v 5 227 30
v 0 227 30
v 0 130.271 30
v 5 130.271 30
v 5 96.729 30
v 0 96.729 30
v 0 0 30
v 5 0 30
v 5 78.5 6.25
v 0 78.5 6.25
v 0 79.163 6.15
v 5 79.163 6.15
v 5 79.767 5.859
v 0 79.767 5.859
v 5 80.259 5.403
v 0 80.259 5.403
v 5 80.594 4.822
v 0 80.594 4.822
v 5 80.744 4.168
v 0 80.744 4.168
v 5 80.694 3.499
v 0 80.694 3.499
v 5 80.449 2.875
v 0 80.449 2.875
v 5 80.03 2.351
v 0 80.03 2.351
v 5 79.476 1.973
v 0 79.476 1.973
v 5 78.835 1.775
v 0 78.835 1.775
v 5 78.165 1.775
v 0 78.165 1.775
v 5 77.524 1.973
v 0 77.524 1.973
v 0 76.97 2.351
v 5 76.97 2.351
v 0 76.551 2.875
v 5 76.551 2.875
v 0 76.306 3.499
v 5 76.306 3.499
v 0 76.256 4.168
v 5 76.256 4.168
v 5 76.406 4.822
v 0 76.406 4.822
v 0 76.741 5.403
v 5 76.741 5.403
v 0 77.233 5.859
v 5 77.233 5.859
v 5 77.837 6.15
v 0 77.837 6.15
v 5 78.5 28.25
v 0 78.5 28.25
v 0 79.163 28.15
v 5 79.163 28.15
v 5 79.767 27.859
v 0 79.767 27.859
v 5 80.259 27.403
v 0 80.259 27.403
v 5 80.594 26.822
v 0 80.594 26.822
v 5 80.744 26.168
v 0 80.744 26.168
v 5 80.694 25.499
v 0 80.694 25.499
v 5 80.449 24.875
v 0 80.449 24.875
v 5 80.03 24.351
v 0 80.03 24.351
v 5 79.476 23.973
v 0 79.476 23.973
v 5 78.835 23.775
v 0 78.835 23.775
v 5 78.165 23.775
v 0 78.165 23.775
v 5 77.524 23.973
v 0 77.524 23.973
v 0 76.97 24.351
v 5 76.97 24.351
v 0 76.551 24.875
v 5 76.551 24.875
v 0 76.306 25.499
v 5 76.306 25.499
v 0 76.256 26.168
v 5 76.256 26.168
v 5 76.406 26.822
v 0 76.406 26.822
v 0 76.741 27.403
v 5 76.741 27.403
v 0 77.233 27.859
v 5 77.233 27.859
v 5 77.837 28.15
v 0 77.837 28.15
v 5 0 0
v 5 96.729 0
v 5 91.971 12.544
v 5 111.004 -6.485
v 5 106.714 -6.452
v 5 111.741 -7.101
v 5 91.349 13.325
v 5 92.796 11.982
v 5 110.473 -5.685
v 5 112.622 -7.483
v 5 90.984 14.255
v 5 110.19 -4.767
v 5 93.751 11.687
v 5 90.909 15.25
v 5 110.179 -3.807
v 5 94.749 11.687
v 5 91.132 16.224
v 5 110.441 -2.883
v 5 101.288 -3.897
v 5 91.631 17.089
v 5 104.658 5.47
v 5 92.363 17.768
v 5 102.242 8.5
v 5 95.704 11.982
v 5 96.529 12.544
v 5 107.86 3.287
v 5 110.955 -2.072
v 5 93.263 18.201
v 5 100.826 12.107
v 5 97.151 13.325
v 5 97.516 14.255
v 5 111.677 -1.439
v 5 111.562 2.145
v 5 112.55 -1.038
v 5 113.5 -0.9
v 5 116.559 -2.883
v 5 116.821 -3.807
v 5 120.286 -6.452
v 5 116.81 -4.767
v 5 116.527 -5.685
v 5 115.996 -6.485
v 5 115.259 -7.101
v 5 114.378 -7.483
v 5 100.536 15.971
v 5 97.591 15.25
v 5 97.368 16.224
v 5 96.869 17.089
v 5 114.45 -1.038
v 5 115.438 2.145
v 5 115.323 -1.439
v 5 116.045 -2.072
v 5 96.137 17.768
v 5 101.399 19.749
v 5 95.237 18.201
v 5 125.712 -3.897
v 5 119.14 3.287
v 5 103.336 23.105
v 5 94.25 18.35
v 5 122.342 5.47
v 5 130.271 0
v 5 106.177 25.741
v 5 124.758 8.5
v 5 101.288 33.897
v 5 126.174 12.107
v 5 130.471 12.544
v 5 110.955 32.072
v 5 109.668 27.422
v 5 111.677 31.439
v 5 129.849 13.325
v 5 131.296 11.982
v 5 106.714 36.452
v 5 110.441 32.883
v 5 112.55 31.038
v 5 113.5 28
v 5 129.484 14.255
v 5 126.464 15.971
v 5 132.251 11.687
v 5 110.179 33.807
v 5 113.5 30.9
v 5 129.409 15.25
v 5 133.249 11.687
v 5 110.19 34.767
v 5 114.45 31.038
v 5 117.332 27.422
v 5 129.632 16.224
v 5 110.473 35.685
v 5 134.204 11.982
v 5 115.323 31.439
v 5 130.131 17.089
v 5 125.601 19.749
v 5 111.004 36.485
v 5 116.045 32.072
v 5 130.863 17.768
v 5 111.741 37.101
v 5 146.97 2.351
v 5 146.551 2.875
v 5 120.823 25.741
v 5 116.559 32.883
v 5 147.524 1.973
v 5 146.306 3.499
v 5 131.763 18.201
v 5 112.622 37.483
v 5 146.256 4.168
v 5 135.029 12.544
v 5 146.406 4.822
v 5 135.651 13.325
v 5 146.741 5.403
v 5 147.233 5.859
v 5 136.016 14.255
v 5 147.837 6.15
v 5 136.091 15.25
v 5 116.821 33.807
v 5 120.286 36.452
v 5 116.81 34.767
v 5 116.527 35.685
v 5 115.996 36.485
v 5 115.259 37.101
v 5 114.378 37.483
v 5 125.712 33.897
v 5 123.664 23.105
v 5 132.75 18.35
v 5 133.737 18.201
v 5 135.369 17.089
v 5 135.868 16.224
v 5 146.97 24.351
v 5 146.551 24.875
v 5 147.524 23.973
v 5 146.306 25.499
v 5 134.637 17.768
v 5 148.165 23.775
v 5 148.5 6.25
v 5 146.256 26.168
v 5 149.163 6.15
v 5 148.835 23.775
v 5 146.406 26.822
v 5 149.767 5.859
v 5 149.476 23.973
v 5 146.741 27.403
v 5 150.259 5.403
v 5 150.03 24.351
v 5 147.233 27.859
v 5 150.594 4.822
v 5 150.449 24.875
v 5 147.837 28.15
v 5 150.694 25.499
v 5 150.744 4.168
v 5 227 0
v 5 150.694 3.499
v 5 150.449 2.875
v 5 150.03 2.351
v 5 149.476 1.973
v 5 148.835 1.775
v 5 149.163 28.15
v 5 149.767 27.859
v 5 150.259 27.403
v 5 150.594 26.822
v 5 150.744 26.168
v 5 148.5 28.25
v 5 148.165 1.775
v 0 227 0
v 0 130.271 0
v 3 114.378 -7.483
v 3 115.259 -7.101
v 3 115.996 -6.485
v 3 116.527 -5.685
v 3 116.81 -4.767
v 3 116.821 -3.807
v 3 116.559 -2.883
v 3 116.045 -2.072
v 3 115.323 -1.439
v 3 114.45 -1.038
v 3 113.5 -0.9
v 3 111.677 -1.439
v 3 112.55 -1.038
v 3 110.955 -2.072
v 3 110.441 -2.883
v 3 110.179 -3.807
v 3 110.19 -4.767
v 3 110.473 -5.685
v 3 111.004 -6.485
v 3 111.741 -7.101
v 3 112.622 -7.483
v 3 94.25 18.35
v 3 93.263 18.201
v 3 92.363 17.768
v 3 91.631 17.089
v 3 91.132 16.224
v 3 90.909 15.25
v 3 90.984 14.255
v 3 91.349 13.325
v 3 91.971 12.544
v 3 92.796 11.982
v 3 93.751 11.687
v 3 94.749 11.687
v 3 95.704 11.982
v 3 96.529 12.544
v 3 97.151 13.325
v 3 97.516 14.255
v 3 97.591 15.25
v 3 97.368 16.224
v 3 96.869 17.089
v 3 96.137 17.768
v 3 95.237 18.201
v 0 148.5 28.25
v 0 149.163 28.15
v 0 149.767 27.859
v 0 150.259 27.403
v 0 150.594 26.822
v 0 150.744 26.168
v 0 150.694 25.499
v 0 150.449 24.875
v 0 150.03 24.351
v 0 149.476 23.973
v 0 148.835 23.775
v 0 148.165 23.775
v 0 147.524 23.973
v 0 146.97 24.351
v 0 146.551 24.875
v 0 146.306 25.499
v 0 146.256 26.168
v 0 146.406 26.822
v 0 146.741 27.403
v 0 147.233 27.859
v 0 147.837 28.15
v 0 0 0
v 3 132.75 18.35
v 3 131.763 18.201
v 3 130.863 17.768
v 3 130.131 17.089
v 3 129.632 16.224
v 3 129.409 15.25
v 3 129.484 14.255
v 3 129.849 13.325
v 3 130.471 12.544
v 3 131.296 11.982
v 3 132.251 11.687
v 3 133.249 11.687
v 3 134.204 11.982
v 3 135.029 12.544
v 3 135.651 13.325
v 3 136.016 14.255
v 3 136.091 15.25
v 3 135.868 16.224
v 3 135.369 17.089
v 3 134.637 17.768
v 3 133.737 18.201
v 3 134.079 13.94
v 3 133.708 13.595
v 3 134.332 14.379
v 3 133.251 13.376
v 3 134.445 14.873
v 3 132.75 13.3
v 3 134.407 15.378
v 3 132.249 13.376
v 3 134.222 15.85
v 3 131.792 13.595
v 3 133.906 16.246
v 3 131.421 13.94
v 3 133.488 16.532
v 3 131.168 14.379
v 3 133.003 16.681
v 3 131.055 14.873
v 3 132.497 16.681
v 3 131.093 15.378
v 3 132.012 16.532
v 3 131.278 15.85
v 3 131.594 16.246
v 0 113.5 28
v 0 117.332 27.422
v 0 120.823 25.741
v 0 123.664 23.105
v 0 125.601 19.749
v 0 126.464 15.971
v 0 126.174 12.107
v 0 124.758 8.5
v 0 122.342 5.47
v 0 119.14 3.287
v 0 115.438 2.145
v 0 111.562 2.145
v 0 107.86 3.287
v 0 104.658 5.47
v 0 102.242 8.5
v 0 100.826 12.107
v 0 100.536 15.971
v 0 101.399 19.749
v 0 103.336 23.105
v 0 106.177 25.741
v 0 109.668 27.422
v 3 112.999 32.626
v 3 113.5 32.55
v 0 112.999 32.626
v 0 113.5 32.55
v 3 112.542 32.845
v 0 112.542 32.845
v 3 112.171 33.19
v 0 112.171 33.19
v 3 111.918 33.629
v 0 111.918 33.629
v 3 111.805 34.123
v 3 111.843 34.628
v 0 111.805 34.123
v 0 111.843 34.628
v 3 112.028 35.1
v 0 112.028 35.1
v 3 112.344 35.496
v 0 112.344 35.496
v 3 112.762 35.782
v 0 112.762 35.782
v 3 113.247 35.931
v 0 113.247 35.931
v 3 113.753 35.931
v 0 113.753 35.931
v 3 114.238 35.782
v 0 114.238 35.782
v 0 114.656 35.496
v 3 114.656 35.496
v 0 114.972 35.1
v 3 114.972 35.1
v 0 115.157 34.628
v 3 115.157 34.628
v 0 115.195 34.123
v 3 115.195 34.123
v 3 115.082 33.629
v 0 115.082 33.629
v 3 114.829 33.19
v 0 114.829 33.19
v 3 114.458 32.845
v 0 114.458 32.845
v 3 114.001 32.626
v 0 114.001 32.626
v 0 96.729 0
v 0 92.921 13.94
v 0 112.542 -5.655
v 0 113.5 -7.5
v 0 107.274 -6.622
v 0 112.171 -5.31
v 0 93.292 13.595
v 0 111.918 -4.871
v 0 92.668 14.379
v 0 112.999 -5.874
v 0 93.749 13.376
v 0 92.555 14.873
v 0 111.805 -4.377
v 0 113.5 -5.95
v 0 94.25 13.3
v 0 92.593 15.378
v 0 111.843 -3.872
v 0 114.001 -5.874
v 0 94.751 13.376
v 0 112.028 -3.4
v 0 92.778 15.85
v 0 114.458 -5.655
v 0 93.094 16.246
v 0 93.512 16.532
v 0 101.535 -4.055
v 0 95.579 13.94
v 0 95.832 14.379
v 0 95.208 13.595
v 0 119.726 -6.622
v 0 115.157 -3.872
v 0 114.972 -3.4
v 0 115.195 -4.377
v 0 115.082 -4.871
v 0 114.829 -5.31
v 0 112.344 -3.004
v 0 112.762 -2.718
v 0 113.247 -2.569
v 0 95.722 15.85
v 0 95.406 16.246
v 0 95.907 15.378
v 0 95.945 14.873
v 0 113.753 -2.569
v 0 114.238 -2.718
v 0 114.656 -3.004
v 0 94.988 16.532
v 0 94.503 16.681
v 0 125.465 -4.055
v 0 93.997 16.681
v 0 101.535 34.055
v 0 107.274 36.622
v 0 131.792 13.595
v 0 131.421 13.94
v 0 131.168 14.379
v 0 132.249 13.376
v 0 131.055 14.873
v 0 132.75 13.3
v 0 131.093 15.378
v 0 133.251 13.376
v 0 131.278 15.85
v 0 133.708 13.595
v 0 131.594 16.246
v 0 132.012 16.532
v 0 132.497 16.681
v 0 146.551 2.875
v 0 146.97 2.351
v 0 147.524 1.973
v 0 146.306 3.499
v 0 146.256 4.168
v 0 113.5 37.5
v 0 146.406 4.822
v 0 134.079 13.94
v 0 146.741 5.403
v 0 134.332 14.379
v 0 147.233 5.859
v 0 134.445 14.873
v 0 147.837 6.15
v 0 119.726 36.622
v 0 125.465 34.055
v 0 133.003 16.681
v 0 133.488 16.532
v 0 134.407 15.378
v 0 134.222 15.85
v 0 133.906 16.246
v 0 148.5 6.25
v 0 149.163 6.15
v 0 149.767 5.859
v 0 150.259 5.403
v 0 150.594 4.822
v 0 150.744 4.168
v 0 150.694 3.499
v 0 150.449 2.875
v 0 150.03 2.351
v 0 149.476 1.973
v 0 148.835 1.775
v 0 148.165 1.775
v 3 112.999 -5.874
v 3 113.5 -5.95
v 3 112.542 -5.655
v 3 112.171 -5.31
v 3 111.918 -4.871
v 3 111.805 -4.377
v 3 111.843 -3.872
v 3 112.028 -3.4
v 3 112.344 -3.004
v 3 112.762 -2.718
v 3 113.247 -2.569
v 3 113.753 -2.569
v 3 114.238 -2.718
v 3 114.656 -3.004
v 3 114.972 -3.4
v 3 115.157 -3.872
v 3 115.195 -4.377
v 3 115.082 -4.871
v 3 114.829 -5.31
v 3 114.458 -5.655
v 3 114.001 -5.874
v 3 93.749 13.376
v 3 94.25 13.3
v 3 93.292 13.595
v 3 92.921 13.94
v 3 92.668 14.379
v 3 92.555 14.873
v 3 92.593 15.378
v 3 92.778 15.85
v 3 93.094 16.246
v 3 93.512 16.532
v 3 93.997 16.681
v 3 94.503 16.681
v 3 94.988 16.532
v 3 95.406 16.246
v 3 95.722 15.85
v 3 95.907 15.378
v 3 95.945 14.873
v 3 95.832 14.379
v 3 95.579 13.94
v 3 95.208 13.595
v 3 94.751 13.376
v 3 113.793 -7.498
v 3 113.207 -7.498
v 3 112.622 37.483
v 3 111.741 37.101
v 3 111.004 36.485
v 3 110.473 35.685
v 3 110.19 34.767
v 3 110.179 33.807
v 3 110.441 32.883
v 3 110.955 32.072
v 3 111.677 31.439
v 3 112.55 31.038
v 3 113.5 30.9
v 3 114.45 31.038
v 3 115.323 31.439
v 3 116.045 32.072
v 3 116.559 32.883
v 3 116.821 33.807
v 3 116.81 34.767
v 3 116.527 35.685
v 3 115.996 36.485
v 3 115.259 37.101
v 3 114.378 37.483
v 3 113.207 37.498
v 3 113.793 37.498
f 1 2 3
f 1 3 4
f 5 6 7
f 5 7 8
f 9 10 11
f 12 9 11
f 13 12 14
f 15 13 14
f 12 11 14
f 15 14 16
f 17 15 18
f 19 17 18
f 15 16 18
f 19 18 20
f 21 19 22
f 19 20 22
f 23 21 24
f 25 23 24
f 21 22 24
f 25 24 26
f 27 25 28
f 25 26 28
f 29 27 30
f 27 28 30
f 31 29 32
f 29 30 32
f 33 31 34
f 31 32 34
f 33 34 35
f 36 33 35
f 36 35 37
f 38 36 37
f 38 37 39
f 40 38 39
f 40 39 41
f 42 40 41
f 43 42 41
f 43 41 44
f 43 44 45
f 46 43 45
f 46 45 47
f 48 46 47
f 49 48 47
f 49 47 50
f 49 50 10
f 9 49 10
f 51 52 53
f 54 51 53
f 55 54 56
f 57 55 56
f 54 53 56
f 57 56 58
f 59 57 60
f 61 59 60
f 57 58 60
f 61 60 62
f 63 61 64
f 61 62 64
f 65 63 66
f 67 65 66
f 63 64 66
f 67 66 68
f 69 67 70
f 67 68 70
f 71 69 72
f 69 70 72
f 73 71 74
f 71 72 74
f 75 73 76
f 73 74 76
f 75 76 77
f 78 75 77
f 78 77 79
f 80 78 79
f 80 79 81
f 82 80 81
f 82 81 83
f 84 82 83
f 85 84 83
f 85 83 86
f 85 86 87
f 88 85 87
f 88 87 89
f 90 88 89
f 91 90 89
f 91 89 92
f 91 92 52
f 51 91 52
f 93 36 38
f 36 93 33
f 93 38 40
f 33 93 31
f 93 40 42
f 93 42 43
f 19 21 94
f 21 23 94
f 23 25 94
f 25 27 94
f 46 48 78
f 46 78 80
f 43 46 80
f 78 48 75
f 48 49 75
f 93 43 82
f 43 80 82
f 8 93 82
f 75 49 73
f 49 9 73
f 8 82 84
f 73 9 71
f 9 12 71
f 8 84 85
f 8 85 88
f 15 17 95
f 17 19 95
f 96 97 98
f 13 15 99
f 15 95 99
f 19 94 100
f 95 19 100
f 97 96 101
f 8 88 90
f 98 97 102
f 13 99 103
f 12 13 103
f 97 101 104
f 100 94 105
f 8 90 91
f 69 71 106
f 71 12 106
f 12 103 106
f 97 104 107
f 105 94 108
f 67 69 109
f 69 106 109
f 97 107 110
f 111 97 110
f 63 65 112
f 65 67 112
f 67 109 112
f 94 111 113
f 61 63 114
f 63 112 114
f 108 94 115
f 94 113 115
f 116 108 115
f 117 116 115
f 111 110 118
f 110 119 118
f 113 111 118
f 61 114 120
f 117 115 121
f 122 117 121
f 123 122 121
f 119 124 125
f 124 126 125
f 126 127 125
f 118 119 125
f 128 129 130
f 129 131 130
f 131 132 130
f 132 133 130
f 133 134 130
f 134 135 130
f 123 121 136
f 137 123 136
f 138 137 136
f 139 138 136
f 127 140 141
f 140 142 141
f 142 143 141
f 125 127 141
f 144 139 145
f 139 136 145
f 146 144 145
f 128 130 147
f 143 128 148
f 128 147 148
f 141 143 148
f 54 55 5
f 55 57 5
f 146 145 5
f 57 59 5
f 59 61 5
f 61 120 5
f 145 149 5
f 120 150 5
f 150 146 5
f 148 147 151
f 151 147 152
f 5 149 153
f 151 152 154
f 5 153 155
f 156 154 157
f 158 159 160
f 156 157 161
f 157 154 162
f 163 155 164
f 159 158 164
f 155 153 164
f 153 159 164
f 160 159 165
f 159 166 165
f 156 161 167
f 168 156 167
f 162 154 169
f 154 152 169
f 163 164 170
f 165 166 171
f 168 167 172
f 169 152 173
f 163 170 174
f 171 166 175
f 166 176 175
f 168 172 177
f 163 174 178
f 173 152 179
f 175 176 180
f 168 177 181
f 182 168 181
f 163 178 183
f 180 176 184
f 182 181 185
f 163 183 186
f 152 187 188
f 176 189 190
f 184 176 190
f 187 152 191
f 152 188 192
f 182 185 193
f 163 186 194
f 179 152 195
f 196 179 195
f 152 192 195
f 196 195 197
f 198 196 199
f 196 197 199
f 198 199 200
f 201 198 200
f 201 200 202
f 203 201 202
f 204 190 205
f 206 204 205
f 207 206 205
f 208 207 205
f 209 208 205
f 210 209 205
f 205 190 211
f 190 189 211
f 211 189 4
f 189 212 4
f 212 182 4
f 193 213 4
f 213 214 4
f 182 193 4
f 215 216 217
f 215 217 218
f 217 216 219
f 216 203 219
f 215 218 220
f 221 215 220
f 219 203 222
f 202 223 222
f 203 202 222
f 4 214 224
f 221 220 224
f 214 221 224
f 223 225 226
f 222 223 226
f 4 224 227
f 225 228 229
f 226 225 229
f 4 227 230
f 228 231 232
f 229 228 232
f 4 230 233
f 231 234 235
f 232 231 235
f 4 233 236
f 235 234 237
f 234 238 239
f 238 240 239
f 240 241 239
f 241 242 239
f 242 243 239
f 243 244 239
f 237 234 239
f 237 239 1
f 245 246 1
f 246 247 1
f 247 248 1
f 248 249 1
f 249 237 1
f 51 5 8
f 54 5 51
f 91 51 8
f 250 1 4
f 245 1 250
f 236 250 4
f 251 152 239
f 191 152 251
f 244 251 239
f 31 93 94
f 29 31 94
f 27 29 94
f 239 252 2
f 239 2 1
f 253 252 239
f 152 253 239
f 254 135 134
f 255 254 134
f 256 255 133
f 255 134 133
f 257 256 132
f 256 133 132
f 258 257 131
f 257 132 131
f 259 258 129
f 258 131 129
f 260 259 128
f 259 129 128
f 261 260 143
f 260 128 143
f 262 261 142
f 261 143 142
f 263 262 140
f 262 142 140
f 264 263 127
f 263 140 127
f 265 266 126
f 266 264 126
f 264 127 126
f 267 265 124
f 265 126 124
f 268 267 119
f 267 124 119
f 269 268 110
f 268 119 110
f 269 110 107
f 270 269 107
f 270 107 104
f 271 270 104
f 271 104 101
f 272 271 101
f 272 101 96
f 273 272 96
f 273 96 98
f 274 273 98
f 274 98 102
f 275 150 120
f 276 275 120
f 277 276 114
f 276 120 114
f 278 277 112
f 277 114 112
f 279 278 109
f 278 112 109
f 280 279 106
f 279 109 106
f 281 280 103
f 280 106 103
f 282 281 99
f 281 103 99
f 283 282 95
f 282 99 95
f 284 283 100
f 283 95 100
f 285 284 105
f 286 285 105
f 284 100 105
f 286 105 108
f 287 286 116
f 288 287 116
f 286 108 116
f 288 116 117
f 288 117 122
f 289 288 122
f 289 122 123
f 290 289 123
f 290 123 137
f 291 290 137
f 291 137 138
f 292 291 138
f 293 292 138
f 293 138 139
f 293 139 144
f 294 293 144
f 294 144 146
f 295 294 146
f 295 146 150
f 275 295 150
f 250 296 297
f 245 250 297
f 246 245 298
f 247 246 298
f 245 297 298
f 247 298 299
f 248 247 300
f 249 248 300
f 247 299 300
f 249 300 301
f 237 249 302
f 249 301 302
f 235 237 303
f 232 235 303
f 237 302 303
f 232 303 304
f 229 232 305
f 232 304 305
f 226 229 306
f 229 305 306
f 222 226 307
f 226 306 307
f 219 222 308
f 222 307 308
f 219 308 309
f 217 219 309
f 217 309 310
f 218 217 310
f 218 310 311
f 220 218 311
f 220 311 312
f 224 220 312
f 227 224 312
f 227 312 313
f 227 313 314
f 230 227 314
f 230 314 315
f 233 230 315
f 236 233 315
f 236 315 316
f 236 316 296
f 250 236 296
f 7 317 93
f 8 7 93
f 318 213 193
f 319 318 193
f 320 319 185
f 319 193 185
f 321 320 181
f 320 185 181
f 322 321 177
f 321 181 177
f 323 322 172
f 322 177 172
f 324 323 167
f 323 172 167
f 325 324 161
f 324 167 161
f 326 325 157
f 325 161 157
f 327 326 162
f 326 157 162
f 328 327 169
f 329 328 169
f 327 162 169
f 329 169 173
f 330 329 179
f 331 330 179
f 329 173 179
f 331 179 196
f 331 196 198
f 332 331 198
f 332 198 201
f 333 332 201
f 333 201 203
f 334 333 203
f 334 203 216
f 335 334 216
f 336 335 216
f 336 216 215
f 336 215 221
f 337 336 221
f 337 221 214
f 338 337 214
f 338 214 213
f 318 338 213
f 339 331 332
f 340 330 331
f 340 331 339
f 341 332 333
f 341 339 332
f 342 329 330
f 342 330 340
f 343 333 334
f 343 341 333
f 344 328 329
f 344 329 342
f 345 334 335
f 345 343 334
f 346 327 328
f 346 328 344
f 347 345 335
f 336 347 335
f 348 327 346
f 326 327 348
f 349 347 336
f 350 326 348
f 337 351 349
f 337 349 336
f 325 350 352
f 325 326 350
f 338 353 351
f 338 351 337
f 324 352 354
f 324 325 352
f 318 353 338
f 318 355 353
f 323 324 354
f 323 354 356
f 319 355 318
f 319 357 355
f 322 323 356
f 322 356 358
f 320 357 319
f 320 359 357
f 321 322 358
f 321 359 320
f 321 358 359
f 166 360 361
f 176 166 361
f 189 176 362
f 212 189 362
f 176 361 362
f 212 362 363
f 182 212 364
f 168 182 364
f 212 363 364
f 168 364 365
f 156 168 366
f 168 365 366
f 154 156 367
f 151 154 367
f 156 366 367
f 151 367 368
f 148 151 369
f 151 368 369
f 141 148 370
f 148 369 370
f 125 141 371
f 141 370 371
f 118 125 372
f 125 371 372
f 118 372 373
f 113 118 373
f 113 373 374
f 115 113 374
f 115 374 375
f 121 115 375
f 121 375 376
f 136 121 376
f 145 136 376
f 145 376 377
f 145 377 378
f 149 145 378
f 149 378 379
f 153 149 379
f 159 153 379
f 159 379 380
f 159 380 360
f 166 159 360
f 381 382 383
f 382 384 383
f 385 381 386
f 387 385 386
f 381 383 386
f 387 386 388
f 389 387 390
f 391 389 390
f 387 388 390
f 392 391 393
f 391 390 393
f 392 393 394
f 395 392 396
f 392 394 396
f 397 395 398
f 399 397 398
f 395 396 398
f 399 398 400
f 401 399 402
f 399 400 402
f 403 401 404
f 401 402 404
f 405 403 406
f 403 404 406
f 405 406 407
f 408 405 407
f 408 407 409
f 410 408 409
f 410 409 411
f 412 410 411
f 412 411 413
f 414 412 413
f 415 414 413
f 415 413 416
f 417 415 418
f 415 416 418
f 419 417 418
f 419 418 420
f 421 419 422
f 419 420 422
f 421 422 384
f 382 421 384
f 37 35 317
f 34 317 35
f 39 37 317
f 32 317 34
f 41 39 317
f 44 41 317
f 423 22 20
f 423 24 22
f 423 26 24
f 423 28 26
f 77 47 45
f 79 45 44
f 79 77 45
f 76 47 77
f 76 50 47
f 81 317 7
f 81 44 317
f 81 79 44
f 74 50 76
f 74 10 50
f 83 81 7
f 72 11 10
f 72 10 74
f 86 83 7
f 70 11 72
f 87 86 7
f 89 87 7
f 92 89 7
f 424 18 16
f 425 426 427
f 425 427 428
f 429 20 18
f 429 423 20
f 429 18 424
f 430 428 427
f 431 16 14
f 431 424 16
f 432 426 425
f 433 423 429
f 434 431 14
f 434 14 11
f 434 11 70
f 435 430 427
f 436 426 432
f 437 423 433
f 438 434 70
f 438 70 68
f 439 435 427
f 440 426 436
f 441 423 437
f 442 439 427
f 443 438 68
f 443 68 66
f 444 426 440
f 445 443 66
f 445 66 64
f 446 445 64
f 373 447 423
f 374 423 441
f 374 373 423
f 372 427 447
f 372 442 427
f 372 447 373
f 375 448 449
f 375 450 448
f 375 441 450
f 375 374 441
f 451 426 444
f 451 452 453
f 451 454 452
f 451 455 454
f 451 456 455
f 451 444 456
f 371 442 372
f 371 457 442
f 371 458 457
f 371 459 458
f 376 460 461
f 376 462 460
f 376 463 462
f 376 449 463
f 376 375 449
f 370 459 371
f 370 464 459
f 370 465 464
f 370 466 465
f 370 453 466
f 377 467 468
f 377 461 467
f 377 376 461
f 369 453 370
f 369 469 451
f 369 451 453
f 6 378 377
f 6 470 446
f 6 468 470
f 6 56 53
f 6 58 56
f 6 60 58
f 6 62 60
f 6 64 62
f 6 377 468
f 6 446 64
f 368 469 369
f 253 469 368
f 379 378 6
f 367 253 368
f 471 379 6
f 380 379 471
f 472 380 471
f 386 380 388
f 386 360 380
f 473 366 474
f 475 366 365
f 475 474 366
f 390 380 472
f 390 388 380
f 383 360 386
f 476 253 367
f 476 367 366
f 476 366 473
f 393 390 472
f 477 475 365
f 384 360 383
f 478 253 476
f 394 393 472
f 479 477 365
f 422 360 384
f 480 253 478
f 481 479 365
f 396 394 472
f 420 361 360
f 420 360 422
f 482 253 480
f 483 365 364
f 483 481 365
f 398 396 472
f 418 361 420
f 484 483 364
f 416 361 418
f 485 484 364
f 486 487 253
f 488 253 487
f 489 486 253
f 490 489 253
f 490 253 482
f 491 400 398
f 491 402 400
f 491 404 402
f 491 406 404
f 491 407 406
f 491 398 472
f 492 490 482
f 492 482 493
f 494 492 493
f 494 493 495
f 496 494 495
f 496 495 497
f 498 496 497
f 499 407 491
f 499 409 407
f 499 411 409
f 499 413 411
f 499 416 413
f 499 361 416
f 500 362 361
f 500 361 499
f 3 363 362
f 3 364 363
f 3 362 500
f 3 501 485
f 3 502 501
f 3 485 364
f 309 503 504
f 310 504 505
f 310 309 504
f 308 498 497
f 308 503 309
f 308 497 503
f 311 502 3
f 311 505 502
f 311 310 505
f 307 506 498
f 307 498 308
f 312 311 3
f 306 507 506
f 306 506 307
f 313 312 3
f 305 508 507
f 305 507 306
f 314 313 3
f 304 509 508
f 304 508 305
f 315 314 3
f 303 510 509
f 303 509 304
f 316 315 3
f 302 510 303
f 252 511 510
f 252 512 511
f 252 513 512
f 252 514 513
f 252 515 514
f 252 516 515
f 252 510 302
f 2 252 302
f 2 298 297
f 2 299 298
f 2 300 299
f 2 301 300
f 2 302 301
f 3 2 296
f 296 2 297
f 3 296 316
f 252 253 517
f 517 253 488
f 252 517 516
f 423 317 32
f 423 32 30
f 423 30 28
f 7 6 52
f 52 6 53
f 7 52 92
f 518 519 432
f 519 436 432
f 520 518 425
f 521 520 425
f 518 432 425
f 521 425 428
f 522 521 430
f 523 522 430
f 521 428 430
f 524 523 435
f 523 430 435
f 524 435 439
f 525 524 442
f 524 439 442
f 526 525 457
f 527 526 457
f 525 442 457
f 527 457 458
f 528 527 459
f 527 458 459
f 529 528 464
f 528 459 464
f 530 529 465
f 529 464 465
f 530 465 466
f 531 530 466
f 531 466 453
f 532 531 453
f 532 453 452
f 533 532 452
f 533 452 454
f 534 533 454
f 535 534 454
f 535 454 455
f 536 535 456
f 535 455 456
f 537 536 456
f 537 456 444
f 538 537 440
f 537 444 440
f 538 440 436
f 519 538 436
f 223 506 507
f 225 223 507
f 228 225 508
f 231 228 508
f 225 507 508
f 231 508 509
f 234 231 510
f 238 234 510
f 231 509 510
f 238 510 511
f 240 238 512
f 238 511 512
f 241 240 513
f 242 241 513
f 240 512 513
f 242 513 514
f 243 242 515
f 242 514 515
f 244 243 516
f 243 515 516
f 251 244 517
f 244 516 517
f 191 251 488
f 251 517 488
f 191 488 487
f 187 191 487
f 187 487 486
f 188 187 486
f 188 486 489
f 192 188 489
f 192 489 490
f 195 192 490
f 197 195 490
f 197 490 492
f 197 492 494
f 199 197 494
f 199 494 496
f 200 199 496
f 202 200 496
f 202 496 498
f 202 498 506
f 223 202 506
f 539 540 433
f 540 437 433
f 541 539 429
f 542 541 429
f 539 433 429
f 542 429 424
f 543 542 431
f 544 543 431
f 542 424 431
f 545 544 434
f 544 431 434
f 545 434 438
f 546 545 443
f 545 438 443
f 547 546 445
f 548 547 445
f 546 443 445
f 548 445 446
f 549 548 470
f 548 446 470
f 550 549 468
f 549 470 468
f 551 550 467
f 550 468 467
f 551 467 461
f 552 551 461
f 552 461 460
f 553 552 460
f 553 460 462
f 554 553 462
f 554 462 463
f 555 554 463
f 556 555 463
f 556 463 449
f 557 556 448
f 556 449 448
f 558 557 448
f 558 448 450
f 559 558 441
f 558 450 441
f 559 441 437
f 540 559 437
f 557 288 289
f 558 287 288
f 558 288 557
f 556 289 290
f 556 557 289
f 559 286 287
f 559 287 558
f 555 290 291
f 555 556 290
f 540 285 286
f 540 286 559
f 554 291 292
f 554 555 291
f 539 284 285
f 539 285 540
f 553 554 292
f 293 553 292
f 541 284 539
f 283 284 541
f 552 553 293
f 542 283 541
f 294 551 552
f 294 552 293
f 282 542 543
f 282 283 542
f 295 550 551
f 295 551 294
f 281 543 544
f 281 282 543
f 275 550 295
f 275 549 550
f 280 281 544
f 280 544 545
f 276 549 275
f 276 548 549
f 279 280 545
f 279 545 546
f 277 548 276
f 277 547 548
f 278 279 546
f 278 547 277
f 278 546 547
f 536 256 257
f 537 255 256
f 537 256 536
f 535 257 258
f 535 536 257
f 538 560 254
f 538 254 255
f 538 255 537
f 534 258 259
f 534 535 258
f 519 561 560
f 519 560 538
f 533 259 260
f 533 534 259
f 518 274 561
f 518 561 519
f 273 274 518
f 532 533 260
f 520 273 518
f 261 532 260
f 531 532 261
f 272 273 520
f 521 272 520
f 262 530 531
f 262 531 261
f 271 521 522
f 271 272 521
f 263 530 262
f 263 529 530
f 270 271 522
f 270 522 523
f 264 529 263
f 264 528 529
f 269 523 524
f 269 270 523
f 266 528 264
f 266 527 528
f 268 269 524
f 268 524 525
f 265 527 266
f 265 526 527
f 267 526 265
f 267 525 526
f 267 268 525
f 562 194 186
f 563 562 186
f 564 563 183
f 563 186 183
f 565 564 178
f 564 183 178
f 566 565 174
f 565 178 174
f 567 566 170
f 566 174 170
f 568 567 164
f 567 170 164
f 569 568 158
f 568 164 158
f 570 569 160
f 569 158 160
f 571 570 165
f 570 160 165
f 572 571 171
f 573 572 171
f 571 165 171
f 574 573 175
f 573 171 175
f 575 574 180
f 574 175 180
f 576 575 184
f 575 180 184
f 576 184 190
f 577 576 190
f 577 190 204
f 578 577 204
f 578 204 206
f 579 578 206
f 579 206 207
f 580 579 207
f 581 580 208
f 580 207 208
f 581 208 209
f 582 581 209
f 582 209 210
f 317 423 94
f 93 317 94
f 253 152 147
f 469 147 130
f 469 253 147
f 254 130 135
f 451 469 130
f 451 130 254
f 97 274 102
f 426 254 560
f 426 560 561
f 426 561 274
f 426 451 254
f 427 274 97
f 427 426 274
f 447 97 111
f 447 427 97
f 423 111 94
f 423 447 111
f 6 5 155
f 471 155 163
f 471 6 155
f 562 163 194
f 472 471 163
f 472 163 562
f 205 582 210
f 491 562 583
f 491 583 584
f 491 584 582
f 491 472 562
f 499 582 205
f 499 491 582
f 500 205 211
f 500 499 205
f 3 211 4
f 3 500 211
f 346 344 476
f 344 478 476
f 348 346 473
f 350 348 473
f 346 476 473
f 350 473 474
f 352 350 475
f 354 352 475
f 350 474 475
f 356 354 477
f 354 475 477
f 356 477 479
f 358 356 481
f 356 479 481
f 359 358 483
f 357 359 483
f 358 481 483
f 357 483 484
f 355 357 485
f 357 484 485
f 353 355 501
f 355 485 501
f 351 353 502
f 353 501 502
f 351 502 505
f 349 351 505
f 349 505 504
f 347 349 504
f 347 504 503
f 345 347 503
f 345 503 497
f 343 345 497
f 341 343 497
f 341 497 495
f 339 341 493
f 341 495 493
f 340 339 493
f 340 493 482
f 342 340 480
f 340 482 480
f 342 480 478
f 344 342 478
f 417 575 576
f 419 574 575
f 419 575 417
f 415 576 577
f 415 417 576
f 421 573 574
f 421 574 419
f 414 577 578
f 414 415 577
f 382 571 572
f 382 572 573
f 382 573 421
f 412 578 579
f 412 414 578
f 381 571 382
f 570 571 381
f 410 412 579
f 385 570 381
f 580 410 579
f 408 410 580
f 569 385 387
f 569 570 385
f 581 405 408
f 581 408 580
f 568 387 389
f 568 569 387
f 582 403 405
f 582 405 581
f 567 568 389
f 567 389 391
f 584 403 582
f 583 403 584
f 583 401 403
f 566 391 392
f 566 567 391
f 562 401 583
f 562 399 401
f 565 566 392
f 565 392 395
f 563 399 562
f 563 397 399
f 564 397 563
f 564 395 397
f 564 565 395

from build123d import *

# Parameters (mm, degrees)
SKETCH_1_W                  = 5
SKETCH_1_H                  = 30
EXTRUDE_1_DEPTH             = 227
SKETCH_2_R                  = 22.5
EXTRUDE_2_DEPTH             = 5
SKETCH_3_R                  = 13
CUT_EXTRUDE_1_DEPTH         = 231.130940988
HOLE_WIZARD_M31_D           = 3.4
HOLE_WIZARD_M31_CBORE_D     = 6.7
HOLE_WIZARD_M31_CBORE_DEPTH = 2
HOLE_WIZARD_M41_D           = 4.5


with BuildPart() as part:
    # Эскиз1 → Бобышка-Вытянуть1 (new body)
    with BuildSketch(Plane(origin=(0, 0, 0), x_dir=(1, 0, 0), z_dir=(0, 1, 0))):
        with Locations((2.5, -15)):
            Rectangle(SKETCH_1_W, SKETCH_1_H)
    extrude(amount=EXTRUDE_1_DEPTH)

    # Эскиз2 → Бобышка-Вытянуть2 (add)
    with BuildSketch(Plane.ZY):
        with Locations((15, 113.5)):
            Circle(SKETCH_2_R)
    extrude(amount=-EXTRUDE_2_DEPTH)

    # Эскиз3 → Вырез-Вытянуть1 (cut, through all)
    with BuildSketch(Plane.ZY):
        with Locations((15, 113.5)):
            Circle(SKETCH_3_R)
    extrude(amount=-CUT_EXTRUDE_1_DEPTH, mode=Mode.SUBTRACT)

    # Цековка для  винта с полукруглой головкой M31 (through all)
    with Locations(Plane(origin=(5, -25.024735225, 7.262908886), x_dir=(0, 0, 1), z_dir=(1, 0, 0))):
        with Locations((7.737091114, -157.774735225), (-11.512908886, -138.524735225), (7.737091114, -119.274735225), (26.987091114, -138.524735225)):
            CounterBoreHole(HOLE_WIZARD_M31_D / 2, HOLE_WIZARD_M31_CBORE_D / 2, HOLE_WIZARD_M31_CBORE_DEPTH)

    # Отверстие с зазором M41 (through all)
    with Locations(Plane(origin=(5, 0, 0), x_dir=(0, 0, -1), z_dir=(1, 0, 0))):
        with Locations((-26, 148.5), (-4, 148.5), (-4, 78.5), (-26, 78.5)):
            Hole(HOLE_WIZARD_M41_D / 2)


solid = part.part
